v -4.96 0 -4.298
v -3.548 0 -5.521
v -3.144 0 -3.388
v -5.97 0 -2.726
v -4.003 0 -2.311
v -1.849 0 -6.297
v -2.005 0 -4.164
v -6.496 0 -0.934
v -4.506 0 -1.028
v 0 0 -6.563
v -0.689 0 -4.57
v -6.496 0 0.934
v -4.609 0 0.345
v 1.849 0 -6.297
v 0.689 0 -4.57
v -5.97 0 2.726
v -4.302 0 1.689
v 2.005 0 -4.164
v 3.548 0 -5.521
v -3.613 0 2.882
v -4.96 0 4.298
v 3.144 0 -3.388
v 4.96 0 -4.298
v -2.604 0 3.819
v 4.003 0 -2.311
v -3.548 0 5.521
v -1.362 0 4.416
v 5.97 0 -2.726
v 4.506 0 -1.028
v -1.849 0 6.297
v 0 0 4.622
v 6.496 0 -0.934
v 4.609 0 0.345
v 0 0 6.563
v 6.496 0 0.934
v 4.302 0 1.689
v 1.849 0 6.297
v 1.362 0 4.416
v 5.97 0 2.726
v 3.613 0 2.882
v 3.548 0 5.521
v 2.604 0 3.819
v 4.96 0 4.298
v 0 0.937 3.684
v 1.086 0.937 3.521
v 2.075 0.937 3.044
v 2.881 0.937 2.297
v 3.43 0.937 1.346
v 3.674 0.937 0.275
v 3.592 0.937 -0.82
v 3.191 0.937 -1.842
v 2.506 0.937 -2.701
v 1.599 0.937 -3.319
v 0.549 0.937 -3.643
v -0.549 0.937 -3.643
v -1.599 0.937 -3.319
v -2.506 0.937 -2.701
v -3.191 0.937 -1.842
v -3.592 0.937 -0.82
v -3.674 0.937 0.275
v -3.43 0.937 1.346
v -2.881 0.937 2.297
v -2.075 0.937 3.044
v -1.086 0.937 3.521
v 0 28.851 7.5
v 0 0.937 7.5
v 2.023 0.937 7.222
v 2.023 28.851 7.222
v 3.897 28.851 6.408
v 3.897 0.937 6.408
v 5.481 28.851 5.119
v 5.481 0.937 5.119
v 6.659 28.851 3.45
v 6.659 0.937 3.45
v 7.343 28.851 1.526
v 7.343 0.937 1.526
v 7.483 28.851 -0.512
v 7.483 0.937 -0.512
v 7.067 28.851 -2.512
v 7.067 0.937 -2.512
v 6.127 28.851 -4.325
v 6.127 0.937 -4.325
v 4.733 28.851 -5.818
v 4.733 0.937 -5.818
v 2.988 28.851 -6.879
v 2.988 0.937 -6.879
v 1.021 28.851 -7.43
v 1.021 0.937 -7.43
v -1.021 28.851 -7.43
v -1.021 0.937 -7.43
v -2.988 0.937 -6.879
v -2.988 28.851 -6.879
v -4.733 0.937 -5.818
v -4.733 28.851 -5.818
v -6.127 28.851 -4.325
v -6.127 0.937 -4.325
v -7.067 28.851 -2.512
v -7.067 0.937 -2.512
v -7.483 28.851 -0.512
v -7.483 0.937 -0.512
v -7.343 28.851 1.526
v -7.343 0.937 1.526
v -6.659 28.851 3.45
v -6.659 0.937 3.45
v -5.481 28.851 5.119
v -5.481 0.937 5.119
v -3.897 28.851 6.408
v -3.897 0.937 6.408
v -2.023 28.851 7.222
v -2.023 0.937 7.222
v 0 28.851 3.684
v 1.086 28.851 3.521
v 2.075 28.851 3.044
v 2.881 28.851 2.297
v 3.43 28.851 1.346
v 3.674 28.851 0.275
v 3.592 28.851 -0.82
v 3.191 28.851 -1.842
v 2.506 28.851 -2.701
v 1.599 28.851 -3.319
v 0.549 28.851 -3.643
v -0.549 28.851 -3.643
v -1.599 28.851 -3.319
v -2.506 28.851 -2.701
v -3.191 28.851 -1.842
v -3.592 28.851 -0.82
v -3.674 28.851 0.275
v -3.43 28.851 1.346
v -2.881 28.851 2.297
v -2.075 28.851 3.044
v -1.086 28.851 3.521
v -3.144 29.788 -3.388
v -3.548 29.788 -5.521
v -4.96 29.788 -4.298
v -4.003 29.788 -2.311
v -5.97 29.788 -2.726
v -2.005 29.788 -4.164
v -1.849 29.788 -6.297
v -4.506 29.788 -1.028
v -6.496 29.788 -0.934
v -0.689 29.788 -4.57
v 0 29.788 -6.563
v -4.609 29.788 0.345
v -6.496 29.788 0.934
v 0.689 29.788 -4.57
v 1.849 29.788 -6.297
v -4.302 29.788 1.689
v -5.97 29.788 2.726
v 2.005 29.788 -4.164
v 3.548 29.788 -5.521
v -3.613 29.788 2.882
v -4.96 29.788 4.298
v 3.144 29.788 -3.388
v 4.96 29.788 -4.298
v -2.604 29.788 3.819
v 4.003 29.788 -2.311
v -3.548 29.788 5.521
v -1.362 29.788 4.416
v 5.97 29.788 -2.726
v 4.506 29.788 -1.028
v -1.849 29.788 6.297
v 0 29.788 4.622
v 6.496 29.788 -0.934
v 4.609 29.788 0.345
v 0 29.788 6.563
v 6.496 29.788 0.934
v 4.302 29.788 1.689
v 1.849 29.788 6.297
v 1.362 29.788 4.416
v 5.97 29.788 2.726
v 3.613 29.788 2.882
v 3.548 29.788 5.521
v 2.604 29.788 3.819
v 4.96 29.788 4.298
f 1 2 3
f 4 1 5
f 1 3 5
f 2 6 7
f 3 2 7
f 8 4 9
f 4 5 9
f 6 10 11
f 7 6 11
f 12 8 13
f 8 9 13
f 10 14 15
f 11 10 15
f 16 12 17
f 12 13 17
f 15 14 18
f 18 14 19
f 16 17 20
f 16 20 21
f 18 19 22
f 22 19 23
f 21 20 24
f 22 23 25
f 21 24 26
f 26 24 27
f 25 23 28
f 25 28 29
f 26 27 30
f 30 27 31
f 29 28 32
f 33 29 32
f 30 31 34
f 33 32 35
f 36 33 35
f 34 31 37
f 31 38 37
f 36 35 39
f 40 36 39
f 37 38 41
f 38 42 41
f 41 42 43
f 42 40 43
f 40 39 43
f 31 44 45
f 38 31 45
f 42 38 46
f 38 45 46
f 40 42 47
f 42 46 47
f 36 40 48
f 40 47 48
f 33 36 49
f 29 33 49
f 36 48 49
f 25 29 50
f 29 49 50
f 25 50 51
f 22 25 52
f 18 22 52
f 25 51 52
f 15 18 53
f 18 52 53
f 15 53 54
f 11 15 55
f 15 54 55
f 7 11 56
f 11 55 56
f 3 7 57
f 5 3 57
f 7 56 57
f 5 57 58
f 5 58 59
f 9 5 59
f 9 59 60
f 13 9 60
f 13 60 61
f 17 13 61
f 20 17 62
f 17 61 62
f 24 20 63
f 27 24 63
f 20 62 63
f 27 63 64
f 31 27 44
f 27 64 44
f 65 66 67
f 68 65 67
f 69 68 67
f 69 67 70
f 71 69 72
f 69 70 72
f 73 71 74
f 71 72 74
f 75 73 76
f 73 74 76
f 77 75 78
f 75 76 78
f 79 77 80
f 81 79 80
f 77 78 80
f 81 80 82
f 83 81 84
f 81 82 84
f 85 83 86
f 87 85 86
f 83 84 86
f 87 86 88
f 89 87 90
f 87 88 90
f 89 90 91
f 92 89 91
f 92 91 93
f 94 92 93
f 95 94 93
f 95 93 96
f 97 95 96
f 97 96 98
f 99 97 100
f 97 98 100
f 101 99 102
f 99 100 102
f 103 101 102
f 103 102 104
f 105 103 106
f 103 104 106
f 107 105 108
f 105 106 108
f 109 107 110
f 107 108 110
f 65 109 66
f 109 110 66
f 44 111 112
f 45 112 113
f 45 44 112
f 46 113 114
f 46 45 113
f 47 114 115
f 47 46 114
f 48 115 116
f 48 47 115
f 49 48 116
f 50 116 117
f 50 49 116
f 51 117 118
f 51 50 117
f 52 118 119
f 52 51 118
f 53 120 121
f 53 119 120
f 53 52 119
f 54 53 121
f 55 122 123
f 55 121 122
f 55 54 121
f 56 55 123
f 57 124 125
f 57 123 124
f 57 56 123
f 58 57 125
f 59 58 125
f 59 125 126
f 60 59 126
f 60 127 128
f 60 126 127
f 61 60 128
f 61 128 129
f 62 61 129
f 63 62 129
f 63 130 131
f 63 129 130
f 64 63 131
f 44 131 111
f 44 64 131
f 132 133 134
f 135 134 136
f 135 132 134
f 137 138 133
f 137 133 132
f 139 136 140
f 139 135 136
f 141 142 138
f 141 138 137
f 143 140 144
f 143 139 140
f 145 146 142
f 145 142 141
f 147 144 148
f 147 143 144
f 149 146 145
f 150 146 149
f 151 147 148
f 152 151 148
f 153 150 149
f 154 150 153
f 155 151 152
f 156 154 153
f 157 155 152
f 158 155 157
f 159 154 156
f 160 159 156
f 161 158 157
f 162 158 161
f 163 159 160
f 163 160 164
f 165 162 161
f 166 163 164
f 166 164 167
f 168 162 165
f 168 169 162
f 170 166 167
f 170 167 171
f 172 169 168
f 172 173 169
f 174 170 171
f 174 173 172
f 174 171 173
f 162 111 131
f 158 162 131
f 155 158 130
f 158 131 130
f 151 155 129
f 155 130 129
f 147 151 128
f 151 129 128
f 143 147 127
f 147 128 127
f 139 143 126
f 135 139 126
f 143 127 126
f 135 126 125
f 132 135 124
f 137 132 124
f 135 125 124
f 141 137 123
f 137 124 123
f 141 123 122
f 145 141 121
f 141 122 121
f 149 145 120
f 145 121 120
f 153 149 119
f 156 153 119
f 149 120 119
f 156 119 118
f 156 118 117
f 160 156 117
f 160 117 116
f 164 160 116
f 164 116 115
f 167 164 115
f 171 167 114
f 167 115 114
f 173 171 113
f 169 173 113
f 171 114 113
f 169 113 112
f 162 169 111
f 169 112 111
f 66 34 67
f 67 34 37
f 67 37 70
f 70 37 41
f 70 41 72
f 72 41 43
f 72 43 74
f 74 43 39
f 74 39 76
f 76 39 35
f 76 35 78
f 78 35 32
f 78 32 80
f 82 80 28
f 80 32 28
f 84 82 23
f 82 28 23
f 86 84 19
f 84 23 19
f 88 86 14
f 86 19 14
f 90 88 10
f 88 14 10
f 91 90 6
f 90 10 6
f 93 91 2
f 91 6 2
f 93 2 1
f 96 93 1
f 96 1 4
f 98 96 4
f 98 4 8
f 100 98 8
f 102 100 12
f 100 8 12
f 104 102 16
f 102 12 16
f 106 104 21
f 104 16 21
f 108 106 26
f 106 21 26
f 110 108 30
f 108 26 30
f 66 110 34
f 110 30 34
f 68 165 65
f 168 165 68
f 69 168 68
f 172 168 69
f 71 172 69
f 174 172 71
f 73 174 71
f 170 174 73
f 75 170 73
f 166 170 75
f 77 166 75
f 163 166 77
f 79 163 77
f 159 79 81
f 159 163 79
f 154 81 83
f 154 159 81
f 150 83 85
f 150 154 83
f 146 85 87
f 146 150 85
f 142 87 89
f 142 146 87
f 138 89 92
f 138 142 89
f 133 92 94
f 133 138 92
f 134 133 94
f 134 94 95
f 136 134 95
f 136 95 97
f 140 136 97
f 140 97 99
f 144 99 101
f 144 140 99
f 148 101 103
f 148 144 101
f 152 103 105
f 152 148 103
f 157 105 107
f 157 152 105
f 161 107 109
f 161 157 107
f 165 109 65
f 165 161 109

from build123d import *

# Parameters (mm, degrees)
SKETCH1_R           = 7.5
BOSS_EXTRUDE1_DEPTH = 29.788449063
SKETCH2_R           = 3.684354477
CUT_EXTRUDE1_DEPTH  = 32.620431647
CHAMFER1_SIZE       = 0.93742991


with BuildPart() as part:
    # Sketch1 → Boss-Extrude1 (new body)
    with BuildSketch(Plane(origin=(0, 0, 0), x_dir=(1, 0, 0), z_dir=(0, 1, 0))):
        Circle(SKETCH1_R)
    extrude(amount=BOSS_EXTRUDE1_DEPTH)

    # Sketch2 → Cut-Extrude1 (cut, through all)
    with BuildSketch(Plane(origin=(0, 0, 0), x_dir=(1, 0, 0), z_dir=(0, 1, 0))):
        Circle(SKETCH2_R)
    extrude(amount=CUT_EXTRUDE1_DEPTH, mode=Mode.SUBTRACT)

    # Chamfer1
    chamfer1_edges = [part.edges().sort_by_distance(p)[0] for p in [
        (-3.684354477, 29.788449063, 0),
        (-3.684354477, 0, 0),
        (-7.5, 0, 0),
        (-7.5, 29.788449063, 0),
    ]]
    chamfer(chamfer1_edges, length=CHAMFER1_SIZE)


solid = part.part
